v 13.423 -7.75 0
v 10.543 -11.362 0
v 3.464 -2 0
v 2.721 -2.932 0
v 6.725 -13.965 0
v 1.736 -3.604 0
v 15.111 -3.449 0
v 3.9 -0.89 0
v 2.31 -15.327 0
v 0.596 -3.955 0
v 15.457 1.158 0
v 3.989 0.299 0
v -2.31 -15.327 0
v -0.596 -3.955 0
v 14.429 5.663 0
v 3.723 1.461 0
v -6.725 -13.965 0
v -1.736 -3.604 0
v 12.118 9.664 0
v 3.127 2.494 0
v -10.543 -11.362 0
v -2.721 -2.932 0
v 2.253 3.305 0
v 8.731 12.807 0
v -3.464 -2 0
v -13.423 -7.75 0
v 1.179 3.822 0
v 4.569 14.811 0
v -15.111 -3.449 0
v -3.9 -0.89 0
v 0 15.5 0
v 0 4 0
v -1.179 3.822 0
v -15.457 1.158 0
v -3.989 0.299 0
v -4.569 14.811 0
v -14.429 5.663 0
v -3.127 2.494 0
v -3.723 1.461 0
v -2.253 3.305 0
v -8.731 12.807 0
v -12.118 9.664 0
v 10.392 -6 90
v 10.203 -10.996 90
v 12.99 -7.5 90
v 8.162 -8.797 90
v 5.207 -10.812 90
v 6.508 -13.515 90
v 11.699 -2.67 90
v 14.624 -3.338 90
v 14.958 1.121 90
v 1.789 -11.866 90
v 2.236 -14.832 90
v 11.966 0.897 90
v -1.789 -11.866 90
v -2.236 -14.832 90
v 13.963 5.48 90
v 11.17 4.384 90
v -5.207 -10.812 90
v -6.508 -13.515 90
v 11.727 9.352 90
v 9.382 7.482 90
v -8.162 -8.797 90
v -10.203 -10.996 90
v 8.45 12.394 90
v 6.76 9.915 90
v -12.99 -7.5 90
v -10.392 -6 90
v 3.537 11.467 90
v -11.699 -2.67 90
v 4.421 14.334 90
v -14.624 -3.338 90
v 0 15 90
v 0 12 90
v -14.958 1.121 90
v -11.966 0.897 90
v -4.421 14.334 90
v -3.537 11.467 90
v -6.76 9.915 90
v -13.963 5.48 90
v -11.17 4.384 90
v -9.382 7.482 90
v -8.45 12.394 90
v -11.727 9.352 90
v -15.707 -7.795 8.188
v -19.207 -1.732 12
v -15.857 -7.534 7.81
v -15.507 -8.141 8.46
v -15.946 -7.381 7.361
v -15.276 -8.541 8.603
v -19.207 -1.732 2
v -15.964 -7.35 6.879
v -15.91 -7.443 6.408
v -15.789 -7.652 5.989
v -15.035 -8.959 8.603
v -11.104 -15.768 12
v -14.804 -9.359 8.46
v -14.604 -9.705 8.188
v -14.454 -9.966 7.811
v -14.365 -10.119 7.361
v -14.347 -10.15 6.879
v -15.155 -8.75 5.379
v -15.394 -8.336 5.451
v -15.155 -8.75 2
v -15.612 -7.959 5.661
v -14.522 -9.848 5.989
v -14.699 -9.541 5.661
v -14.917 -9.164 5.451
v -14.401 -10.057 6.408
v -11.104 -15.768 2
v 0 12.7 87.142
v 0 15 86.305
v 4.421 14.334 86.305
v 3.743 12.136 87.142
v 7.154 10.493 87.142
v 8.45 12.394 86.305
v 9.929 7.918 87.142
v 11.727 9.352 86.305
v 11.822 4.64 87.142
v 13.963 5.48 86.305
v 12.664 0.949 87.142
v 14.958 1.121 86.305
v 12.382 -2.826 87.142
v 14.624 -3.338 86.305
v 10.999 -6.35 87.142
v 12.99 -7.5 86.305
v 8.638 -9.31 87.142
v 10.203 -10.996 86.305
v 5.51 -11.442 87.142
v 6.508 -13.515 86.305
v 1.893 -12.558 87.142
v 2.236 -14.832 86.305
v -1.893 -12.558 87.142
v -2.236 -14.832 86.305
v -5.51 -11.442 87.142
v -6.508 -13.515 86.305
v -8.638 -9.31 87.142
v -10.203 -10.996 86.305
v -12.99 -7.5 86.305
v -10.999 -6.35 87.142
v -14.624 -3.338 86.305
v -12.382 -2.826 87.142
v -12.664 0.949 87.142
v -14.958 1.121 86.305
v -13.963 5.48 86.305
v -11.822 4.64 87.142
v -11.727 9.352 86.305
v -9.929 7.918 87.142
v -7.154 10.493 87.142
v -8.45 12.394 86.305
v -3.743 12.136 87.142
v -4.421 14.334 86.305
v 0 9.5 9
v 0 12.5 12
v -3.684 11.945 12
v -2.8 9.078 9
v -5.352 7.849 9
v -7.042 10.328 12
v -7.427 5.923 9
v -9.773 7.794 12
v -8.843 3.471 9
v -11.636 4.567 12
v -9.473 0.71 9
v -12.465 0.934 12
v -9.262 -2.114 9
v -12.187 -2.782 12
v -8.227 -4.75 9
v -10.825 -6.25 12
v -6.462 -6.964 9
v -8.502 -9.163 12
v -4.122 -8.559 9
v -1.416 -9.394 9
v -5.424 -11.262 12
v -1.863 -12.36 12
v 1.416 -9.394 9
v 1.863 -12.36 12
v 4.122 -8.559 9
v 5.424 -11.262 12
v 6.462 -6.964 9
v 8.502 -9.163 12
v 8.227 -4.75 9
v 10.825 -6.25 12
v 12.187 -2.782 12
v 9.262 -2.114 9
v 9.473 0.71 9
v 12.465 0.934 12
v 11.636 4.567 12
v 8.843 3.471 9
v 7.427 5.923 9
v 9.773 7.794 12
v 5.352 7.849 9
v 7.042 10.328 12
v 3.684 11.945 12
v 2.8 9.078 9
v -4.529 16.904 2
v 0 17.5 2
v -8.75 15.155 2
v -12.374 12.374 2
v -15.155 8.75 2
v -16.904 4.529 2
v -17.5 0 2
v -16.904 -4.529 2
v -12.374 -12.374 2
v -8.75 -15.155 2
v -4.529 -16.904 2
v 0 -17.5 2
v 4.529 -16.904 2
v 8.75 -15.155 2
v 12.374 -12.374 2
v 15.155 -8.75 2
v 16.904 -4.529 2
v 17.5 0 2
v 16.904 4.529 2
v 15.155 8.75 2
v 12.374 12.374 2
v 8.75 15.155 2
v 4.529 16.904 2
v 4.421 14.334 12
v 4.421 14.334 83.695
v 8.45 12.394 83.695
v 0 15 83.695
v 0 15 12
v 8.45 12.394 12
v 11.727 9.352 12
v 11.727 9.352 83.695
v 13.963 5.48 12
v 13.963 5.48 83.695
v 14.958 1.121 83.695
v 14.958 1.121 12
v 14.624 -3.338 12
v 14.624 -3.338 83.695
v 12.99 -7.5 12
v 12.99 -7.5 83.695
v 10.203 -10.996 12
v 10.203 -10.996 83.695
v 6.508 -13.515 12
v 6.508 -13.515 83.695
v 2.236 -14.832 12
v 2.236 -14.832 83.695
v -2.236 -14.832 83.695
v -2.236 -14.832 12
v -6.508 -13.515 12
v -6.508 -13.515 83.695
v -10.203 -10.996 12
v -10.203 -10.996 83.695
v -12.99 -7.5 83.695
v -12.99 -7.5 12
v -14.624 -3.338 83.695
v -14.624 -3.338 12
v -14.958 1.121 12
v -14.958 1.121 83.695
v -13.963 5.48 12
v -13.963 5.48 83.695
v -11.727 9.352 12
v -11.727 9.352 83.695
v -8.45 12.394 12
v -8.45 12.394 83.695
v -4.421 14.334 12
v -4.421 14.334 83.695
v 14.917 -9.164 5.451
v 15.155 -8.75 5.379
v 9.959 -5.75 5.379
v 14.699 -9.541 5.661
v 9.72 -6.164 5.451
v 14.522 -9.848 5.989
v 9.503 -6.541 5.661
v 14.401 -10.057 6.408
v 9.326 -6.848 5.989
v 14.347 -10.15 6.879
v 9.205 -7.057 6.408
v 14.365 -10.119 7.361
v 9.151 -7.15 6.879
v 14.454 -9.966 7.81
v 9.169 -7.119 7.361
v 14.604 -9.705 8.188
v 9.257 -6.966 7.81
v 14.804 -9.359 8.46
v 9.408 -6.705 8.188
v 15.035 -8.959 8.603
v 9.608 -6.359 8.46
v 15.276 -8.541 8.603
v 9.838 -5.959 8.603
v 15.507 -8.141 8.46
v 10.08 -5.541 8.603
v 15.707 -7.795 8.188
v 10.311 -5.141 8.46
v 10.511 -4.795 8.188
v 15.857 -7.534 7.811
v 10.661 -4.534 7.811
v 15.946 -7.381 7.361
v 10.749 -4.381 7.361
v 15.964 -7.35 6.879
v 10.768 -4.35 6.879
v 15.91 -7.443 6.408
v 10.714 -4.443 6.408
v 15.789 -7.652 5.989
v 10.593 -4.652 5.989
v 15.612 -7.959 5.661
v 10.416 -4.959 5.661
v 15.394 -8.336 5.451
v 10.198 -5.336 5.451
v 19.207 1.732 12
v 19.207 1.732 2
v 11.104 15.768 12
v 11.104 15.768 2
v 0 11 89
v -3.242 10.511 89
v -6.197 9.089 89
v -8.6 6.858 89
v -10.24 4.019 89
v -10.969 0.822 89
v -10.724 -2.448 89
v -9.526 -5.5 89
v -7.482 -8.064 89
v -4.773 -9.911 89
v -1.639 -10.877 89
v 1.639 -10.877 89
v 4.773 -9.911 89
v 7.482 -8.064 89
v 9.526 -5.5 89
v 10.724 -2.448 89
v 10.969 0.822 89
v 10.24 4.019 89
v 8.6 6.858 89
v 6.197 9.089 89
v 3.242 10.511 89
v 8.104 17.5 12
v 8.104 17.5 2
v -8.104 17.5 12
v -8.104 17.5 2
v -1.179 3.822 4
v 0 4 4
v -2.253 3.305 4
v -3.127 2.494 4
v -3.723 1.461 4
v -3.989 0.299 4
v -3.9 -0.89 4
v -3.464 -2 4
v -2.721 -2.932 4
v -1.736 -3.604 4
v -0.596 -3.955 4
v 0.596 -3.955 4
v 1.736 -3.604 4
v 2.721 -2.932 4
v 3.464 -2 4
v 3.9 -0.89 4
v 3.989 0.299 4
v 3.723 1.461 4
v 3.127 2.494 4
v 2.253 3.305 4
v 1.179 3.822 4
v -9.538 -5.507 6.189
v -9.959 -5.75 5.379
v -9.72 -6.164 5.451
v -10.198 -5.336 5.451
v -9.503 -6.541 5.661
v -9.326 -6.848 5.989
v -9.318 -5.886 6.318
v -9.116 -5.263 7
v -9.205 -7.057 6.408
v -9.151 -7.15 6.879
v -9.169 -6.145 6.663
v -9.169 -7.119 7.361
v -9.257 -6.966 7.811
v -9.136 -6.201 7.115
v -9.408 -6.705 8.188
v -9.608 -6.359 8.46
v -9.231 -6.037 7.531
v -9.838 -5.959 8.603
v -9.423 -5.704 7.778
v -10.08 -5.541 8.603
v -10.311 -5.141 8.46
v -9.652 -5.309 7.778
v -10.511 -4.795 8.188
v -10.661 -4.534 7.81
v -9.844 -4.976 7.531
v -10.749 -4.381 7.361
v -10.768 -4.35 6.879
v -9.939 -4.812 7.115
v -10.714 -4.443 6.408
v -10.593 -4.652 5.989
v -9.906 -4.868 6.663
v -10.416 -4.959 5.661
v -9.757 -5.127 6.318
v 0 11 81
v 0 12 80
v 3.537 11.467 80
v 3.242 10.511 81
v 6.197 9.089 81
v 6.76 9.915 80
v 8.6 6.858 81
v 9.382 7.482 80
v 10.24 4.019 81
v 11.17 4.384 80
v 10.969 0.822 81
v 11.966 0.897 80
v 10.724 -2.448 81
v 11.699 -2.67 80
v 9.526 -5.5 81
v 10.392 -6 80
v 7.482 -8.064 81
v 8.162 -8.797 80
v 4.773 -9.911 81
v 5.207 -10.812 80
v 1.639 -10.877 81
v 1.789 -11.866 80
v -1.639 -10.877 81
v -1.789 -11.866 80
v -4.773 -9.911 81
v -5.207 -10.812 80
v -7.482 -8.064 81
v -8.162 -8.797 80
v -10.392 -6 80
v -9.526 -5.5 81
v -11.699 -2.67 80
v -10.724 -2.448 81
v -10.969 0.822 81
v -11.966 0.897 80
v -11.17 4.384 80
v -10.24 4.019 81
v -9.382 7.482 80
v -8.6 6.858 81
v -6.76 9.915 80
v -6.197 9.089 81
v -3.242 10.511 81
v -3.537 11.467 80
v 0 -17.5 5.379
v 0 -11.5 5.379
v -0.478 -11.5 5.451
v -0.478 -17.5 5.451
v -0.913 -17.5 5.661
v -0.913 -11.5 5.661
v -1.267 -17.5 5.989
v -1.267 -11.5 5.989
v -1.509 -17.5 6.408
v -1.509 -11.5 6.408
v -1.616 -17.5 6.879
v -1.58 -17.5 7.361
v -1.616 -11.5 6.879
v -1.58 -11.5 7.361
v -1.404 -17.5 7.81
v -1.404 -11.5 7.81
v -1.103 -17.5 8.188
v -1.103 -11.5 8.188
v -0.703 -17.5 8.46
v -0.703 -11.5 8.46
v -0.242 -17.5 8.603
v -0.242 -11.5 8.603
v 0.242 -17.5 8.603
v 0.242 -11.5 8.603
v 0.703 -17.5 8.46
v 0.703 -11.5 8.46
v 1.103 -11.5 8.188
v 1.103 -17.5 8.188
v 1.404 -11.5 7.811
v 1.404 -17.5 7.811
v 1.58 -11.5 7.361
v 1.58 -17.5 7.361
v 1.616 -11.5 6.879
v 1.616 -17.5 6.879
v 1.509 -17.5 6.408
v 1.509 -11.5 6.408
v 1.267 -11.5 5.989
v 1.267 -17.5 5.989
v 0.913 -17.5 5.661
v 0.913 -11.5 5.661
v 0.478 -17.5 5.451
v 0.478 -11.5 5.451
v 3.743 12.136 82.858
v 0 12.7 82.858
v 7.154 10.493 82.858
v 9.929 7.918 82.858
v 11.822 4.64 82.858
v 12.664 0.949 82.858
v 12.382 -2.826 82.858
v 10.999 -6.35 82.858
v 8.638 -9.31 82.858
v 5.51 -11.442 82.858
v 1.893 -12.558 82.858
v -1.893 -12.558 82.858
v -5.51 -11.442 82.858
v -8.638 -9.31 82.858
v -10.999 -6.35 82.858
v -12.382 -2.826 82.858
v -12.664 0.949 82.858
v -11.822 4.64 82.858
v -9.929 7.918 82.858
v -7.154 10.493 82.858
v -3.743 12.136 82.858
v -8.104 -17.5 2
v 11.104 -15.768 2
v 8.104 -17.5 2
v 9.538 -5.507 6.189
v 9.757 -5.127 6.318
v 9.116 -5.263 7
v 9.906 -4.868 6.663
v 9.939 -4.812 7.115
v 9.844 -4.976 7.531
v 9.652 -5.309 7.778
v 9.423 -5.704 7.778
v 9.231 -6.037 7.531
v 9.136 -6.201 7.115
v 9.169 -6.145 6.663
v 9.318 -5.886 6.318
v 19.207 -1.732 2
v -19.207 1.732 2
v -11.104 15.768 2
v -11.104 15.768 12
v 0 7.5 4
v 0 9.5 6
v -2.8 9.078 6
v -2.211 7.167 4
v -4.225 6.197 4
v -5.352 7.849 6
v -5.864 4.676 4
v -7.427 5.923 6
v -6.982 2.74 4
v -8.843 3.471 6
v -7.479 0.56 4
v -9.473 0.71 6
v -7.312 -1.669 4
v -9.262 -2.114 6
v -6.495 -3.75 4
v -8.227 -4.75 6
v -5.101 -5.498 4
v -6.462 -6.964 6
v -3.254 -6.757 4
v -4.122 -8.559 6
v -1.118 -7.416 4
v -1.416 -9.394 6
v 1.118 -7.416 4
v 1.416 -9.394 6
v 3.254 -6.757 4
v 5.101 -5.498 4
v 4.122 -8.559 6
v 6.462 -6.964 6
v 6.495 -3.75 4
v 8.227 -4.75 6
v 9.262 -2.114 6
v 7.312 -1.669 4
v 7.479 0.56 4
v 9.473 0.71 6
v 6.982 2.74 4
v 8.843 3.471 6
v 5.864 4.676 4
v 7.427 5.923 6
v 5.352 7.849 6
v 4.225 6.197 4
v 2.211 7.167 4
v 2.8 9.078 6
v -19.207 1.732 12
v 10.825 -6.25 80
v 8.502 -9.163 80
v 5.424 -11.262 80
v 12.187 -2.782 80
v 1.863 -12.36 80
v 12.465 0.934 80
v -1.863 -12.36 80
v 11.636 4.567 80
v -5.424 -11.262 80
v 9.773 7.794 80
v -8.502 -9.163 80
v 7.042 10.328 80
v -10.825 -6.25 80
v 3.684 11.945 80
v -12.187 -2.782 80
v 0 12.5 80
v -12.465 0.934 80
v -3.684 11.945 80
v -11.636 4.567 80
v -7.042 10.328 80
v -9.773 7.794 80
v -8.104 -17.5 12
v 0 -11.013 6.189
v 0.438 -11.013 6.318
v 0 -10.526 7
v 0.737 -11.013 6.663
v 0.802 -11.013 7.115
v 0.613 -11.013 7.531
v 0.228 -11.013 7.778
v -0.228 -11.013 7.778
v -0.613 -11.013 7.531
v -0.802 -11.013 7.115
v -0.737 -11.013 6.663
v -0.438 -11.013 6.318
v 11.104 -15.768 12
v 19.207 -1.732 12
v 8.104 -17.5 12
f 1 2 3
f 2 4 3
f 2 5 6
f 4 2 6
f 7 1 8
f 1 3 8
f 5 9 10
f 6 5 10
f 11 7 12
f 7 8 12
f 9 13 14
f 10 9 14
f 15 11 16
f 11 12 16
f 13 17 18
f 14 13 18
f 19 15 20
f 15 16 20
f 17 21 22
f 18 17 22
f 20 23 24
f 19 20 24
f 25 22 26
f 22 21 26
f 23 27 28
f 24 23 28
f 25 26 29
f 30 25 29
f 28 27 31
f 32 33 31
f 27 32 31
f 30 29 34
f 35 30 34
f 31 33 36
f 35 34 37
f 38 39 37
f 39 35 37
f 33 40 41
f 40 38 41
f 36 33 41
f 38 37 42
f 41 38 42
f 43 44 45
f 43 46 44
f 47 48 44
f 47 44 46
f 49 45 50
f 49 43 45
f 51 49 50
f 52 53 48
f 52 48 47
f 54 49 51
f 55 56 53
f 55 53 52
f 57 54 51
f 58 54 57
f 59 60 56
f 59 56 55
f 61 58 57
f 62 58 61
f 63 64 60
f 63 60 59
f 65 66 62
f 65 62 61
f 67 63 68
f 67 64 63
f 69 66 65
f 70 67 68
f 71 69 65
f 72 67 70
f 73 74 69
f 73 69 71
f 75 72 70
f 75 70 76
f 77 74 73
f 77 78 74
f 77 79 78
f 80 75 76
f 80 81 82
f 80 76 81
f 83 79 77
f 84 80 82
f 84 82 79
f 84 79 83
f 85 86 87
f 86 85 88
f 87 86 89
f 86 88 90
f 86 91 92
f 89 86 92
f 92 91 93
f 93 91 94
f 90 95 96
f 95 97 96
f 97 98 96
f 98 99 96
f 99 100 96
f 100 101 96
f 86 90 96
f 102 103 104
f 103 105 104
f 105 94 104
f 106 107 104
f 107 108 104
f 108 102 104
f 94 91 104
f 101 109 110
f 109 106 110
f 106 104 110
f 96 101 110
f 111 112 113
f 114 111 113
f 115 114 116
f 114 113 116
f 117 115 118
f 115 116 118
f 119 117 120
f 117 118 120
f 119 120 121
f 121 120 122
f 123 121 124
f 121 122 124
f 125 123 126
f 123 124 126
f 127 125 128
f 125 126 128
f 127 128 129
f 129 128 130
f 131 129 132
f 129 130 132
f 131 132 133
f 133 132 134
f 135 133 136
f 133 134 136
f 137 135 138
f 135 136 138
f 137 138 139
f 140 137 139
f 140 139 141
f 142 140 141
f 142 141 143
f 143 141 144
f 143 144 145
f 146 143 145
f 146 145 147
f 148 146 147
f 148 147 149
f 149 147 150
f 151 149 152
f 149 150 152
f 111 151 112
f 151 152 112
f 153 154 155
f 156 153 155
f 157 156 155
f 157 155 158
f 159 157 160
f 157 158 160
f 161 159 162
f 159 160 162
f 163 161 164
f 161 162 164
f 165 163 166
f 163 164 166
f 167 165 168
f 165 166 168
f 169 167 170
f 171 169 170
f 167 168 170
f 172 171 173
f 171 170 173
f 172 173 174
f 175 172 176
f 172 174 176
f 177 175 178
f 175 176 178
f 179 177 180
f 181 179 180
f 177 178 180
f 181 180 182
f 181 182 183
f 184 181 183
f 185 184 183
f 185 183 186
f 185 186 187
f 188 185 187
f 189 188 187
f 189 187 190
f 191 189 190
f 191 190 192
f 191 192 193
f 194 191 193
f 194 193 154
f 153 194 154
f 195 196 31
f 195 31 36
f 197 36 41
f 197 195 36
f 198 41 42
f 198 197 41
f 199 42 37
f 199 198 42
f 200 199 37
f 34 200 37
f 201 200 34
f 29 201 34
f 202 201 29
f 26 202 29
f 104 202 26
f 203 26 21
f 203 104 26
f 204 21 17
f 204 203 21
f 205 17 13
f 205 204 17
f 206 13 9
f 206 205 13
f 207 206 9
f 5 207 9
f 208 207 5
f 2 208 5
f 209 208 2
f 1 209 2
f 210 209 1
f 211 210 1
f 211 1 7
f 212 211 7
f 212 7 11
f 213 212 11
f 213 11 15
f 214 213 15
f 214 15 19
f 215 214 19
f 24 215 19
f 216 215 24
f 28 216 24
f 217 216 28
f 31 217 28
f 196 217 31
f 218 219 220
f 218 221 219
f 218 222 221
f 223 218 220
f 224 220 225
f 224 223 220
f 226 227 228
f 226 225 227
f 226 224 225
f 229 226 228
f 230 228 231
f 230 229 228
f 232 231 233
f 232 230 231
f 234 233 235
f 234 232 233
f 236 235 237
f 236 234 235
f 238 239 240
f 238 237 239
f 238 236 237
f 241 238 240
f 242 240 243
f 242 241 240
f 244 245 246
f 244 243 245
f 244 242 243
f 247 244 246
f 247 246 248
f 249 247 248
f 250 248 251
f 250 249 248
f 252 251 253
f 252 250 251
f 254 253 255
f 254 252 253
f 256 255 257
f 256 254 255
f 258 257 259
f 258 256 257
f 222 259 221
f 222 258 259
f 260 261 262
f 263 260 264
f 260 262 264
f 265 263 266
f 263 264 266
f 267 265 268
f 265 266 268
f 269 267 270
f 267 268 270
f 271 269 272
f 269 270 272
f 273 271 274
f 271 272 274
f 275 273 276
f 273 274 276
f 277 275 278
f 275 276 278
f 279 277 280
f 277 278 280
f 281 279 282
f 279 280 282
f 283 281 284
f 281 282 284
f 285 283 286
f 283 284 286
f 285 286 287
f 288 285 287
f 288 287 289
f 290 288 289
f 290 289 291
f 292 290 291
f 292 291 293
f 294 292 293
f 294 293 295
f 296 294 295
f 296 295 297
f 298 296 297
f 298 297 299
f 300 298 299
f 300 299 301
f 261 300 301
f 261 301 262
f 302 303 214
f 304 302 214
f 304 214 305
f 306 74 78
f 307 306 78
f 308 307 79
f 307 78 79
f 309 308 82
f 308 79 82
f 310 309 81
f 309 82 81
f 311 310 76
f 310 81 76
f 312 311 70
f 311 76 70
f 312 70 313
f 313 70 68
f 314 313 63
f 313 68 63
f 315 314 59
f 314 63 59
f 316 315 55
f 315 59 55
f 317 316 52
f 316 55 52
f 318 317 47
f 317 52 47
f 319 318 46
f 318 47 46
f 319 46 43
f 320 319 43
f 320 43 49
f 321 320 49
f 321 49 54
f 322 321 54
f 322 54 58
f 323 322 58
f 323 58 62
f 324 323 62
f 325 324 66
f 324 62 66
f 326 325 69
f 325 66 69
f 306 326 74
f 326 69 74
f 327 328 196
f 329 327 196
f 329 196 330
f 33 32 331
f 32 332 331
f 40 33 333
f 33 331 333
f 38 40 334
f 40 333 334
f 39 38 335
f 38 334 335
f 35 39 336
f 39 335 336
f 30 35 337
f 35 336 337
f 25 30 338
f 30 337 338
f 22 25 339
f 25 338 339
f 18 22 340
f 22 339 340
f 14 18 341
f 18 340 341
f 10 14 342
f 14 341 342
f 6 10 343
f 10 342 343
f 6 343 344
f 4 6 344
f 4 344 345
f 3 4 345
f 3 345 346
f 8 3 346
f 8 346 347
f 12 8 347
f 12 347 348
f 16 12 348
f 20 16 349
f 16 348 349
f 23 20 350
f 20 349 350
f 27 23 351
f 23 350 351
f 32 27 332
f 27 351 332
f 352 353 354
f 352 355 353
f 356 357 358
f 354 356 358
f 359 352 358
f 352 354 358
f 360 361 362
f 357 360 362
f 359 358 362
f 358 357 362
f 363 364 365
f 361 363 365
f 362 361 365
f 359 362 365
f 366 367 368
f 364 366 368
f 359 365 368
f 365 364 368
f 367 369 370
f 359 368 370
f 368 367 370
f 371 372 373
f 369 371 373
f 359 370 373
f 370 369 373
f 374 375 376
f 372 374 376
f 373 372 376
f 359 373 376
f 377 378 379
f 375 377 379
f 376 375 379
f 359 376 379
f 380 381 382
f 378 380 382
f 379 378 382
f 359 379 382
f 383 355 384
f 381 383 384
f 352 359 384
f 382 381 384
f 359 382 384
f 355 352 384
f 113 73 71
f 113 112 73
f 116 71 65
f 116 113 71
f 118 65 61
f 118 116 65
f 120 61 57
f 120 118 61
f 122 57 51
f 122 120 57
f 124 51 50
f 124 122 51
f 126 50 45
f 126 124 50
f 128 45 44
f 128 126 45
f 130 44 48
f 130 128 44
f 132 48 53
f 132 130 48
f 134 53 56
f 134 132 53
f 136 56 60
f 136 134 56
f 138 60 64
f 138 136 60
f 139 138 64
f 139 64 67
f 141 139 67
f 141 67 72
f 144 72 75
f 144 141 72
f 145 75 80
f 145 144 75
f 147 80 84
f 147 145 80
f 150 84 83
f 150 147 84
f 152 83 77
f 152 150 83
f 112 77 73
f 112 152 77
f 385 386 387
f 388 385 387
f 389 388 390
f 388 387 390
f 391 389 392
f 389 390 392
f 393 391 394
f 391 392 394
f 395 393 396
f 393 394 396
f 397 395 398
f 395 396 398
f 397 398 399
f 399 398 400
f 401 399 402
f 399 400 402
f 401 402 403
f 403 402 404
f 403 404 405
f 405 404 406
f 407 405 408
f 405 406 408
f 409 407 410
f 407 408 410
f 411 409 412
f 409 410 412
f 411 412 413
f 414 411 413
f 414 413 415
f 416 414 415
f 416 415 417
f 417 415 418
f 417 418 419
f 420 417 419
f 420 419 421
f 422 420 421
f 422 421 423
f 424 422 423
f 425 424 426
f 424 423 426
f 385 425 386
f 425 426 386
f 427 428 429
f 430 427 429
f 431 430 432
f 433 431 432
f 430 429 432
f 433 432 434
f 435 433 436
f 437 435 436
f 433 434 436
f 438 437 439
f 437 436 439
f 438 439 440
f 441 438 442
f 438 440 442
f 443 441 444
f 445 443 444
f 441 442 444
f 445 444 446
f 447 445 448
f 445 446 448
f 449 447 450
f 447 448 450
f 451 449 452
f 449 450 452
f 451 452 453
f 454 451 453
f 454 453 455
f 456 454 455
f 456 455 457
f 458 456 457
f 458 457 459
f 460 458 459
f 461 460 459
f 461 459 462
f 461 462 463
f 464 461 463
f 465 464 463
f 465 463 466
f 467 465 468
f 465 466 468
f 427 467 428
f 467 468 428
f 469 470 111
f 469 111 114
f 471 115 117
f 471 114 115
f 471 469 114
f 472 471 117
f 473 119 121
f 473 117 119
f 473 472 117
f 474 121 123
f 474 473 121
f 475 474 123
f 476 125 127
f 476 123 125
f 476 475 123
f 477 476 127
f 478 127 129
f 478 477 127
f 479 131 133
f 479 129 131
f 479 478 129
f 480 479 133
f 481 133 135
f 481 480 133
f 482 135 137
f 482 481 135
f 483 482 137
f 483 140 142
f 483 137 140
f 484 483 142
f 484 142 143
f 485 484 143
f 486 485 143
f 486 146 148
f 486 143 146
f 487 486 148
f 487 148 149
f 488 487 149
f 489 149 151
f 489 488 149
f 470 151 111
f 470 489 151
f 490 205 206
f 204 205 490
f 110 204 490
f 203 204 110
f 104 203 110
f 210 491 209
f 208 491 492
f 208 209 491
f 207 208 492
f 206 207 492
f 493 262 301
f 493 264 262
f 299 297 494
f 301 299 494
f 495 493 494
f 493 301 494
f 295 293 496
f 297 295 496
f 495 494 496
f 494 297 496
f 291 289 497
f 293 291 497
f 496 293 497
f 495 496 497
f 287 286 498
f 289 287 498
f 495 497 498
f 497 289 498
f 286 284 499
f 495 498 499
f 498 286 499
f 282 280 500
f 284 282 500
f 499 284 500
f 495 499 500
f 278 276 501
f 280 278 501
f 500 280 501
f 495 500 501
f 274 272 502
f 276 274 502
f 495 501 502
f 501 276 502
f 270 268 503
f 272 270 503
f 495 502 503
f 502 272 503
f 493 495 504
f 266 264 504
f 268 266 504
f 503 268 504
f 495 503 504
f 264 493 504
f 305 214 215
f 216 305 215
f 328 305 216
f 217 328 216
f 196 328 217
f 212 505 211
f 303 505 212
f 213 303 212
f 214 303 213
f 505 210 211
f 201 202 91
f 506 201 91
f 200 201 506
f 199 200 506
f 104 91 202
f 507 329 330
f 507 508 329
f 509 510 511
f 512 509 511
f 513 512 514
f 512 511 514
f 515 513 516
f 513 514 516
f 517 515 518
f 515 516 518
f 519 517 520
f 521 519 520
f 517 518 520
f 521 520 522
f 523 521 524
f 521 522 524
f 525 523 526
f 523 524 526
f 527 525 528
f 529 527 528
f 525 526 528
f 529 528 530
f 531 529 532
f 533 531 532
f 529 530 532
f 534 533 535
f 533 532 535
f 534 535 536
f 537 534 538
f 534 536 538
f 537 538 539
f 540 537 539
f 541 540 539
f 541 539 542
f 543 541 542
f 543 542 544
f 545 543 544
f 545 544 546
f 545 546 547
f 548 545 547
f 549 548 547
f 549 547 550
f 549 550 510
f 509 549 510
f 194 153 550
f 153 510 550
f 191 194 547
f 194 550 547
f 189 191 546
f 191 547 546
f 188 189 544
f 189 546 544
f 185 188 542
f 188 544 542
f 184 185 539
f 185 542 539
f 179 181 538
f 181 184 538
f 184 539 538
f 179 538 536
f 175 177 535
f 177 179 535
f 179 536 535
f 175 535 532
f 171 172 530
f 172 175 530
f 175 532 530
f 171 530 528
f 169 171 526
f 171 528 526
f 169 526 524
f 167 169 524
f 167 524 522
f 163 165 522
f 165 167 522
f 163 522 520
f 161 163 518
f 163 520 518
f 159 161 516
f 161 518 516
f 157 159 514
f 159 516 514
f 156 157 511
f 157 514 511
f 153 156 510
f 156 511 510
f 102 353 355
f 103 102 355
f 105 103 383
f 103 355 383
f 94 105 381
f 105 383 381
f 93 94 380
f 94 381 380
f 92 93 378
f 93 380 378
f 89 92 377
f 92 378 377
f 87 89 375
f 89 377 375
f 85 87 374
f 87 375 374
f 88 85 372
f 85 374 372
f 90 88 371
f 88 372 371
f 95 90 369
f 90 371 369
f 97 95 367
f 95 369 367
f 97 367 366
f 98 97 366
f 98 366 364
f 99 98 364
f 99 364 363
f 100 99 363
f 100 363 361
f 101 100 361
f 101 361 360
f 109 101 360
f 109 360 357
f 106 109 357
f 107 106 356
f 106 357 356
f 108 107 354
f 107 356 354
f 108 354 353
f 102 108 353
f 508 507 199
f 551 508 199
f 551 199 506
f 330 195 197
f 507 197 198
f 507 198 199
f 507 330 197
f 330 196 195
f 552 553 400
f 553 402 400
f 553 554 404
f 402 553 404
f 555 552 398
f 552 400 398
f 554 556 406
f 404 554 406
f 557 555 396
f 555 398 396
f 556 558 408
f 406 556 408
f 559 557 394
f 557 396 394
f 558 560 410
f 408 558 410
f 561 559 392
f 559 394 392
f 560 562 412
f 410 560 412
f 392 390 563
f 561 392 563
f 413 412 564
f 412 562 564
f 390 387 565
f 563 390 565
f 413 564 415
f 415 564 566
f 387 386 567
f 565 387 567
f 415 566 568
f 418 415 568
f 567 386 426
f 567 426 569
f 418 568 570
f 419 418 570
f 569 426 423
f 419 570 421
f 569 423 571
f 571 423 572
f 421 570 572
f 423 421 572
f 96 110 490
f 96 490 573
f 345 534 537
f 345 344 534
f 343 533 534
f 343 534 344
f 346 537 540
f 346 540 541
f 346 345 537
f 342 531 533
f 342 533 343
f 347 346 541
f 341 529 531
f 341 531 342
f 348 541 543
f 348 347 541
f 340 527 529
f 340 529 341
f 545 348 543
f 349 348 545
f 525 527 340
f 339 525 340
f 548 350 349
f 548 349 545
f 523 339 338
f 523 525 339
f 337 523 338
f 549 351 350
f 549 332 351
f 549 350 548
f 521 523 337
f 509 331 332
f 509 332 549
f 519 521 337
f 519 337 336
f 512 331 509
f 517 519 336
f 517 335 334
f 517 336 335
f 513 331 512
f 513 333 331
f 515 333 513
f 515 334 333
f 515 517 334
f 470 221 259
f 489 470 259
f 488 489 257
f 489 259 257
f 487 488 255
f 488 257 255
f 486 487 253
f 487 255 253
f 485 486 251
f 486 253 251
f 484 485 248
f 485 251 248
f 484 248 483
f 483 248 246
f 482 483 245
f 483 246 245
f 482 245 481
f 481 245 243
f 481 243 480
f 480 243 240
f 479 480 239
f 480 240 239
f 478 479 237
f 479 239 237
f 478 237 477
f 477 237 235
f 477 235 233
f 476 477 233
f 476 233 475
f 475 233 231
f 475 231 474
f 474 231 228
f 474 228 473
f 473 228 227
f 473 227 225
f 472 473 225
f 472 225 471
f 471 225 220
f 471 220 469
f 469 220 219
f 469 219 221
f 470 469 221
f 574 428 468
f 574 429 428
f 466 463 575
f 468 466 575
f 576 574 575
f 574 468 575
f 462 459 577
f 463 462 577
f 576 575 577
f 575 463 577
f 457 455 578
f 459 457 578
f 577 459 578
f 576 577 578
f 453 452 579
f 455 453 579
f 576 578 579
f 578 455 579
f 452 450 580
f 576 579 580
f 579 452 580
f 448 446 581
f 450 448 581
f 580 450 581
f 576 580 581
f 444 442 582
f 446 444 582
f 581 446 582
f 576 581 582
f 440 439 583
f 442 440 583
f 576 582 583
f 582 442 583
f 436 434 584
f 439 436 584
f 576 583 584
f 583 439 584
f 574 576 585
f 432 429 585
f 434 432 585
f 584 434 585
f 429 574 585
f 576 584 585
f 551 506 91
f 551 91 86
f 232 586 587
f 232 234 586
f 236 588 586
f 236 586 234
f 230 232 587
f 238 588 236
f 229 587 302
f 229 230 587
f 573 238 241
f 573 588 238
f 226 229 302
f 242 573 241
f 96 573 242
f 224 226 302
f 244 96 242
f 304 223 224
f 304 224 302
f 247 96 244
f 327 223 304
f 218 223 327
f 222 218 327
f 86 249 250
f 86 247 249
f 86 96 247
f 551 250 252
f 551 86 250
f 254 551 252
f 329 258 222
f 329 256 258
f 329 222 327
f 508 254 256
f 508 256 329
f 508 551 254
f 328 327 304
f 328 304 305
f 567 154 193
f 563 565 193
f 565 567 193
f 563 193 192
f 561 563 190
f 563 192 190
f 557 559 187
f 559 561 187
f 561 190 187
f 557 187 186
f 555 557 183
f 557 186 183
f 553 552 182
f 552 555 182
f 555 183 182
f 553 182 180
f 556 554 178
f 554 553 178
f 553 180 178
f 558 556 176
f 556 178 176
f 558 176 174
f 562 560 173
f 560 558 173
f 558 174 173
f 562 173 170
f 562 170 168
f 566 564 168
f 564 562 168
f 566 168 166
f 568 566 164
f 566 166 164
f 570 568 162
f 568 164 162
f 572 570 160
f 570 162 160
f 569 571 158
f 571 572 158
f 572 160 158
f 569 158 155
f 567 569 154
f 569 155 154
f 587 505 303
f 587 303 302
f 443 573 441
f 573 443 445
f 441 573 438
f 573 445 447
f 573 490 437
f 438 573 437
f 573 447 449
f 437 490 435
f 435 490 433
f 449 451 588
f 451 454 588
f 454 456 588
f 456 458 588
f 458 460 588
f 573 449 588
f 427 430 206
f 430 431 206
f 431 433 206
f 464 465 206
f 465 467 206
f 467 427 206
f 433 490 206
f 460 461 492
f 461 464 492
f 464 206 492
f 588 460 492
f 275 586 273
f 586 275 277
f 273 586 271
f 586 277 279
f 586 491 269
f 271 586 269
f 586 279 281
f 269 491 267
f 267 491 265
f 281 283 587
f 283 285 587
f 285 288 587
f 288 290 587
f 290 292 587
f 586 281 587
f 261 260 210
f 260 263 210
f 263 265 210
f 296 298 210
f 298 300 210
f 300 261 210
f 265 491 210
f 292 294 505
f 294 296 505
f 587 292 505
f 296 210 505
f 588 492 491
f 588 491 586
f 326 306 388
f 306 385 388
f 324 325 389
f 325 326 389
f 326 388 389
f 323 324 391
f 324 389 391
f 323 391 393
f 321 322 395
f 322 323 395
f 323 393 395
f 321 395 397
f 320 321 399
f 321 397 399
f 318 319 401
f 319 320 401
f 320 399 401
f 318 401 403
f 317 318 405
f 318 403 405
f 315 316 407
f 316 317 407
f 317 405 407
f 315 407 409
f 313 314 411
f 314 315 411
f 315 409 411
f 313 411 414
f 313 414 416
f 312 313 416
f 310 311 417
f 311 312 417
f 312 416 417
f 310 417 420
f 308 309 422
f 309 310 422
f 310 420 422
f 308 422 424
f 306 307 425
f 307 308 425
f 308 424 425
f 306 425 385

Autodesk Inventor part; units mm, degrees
ref_plane "YZ Plane" through (0, 0, 0) normal (1, 0, 0) x (0, 1, 0)
ref_plane "XZ Plane" through (0, 0, 0) normal (0, 1, 0) x (-1, 0, 0)
sketch "Esquisse1" plane through (0, 0, 0) normal (1, 0, 0) x (0, 1, 0)
  line L0 (0, 0) -> (0, 68.1349)
  line L1 (15, 83.6949) -> (15, 12)
  line L2 (15.5, 0) -> (4, 0)
  line L3 (4, 0) -> (4, 4)
  line L4 (4, 4) -> (9.5, 4)
  line L5 (15, 90) -> (11, 90)
  line L6 (15, 12) -> (17.5, 12)
  line L7 (17.5, 12) -> (17.5, 2)
  line L8 (17.5, 2) -> (15.5, 0)
  line L9 (12.5, 12) -> (9.5, 9)
  line L10 (9.5, 9) -> (9.5, 4)
  line L11 (11, 90) -> (11, 80)
  line L12 (11, 80) -> (12.5, 80)
  line L13 (12.5, 80) -> (12.5, 12)
  line L14 (15, 90) -> (15, 86.3051)
  line L15 (15, 86.3051) -> (12.7, 87.1422)
  line L16 (12.7, 87.1422) -> (12.7, 82.8578)
  line L17 (12.7, 82.8578) -> (15, 83.6949)
  circle A0 centre (14.2, 85) radius 1.5 construction
  dimension "d1" = 30
  dimension "d2" = 8
  dimension "d3" = 4
  dimension "d5" = 2.5
  dimension "d6" = 2
  dimension "d7" = 2
  dimension "d8" = 10
  dimension "d26" = 3
  dimension "d27" = 3
  dimension "d31" = 2.5
  dimension "d32" = 4
  dimension "d34" = 10
  dimension "d35" = 78
  dimension "d36" = 70
  dimension "d37" = 70
  dimension "d38" = 3
  dimension "d39" = 0.8
  dimension "d40" = 5
revolve "Révolution1" add sketch "Esquisse1" angle 360 about axis through (0, 0, 0) along (0, 0, 1)
ref_plane "Plan de construction1" through (0, 0, 2) normal (0, 0, -1) x (-1, 0, 0)
sketch "Esquisse3" plane through (0, 0, 2) normal (0, 0, -1) x (-1, 0, 0)
  line L0 (10.1036, 17.5) -> (20.2073, 0)
  line L1 (20.2073, 0) -> (10.1036, -17.5)
  line L2 (10.1036, -17.5) -> (-10.1036, -17.5)
  line L3 (-10.1036, -17.5) -> (-20.2073, 0)
  line L4 (-20.2073, 0) -> (-10.1036, 17.5)
  line L5 (-10.1036, 17.5) -> (10.1036, 17.5)
  circle A0 centre (0, 0) radius 17.5 projected
extrude "Extrusion1" add sketch "Esquisse3" against normal blind 10 contours L0 A0 L5 | L0 L1 A0 | A0 L4 L5 | A0 L3 L4 | L1 L2 A0 | A0 L2 L3
chamfer "Chanfrein1" distance 2 angle 45 1 edges at (0, -9.5, 4)
chamfer "Chanfrein2" distance 2 angle 45 6 edges at (10.1036, 17.5, 7) (-10.1036, 17.5, 7) (-20.2073, 0, 7) (-10.1036, -17.5, 7) (10.1036, -17.5, 7) (20.2073, 0, 7)
sketch "Esquisse4" plane through (-8.1036, -17.5, 2) normal (0, -1, 0) x (1, 0, 0)
  line L0 (16.2073, 10) -> (16.2073, 0) projected
  line L1 (0, 10) -> (16.2073, 10) projected
  line L2 (0, 0) -> (0, 10) projected
  line L3 (0, 0) -> (8.1036, 0) projected
  line L4 (8.1036, 0) -> (16.2073, 0) projected
  point P0 (8.1036, -2)
  point P1 (8.1036, 5)
  point P2 (16.2073, 5)
hole "Perçage1" at (0, -17.5, 7) direction (0, 1, 0) diameter 3.242 depth 6 tip angle 118 thread size "M4x0.7" class "6H" standard "ISO Metric profile"
chamfer "Chanfrein3" distance 1 angle 45 2 edges at (0, -11, 90) (0, -11, 80)
pattern_circular "Réseau circulaire1" count 3 over 120 about axis through (0, 0, -10) along (0, 0, 1) of "Perçage1" both ways yes
equation "\"d7\" = d6"
equation "\"d27\" = d26"
equation "\"d37\" = d36"
properties part number "piston_reservoir" material "Acier, galvanisé"
